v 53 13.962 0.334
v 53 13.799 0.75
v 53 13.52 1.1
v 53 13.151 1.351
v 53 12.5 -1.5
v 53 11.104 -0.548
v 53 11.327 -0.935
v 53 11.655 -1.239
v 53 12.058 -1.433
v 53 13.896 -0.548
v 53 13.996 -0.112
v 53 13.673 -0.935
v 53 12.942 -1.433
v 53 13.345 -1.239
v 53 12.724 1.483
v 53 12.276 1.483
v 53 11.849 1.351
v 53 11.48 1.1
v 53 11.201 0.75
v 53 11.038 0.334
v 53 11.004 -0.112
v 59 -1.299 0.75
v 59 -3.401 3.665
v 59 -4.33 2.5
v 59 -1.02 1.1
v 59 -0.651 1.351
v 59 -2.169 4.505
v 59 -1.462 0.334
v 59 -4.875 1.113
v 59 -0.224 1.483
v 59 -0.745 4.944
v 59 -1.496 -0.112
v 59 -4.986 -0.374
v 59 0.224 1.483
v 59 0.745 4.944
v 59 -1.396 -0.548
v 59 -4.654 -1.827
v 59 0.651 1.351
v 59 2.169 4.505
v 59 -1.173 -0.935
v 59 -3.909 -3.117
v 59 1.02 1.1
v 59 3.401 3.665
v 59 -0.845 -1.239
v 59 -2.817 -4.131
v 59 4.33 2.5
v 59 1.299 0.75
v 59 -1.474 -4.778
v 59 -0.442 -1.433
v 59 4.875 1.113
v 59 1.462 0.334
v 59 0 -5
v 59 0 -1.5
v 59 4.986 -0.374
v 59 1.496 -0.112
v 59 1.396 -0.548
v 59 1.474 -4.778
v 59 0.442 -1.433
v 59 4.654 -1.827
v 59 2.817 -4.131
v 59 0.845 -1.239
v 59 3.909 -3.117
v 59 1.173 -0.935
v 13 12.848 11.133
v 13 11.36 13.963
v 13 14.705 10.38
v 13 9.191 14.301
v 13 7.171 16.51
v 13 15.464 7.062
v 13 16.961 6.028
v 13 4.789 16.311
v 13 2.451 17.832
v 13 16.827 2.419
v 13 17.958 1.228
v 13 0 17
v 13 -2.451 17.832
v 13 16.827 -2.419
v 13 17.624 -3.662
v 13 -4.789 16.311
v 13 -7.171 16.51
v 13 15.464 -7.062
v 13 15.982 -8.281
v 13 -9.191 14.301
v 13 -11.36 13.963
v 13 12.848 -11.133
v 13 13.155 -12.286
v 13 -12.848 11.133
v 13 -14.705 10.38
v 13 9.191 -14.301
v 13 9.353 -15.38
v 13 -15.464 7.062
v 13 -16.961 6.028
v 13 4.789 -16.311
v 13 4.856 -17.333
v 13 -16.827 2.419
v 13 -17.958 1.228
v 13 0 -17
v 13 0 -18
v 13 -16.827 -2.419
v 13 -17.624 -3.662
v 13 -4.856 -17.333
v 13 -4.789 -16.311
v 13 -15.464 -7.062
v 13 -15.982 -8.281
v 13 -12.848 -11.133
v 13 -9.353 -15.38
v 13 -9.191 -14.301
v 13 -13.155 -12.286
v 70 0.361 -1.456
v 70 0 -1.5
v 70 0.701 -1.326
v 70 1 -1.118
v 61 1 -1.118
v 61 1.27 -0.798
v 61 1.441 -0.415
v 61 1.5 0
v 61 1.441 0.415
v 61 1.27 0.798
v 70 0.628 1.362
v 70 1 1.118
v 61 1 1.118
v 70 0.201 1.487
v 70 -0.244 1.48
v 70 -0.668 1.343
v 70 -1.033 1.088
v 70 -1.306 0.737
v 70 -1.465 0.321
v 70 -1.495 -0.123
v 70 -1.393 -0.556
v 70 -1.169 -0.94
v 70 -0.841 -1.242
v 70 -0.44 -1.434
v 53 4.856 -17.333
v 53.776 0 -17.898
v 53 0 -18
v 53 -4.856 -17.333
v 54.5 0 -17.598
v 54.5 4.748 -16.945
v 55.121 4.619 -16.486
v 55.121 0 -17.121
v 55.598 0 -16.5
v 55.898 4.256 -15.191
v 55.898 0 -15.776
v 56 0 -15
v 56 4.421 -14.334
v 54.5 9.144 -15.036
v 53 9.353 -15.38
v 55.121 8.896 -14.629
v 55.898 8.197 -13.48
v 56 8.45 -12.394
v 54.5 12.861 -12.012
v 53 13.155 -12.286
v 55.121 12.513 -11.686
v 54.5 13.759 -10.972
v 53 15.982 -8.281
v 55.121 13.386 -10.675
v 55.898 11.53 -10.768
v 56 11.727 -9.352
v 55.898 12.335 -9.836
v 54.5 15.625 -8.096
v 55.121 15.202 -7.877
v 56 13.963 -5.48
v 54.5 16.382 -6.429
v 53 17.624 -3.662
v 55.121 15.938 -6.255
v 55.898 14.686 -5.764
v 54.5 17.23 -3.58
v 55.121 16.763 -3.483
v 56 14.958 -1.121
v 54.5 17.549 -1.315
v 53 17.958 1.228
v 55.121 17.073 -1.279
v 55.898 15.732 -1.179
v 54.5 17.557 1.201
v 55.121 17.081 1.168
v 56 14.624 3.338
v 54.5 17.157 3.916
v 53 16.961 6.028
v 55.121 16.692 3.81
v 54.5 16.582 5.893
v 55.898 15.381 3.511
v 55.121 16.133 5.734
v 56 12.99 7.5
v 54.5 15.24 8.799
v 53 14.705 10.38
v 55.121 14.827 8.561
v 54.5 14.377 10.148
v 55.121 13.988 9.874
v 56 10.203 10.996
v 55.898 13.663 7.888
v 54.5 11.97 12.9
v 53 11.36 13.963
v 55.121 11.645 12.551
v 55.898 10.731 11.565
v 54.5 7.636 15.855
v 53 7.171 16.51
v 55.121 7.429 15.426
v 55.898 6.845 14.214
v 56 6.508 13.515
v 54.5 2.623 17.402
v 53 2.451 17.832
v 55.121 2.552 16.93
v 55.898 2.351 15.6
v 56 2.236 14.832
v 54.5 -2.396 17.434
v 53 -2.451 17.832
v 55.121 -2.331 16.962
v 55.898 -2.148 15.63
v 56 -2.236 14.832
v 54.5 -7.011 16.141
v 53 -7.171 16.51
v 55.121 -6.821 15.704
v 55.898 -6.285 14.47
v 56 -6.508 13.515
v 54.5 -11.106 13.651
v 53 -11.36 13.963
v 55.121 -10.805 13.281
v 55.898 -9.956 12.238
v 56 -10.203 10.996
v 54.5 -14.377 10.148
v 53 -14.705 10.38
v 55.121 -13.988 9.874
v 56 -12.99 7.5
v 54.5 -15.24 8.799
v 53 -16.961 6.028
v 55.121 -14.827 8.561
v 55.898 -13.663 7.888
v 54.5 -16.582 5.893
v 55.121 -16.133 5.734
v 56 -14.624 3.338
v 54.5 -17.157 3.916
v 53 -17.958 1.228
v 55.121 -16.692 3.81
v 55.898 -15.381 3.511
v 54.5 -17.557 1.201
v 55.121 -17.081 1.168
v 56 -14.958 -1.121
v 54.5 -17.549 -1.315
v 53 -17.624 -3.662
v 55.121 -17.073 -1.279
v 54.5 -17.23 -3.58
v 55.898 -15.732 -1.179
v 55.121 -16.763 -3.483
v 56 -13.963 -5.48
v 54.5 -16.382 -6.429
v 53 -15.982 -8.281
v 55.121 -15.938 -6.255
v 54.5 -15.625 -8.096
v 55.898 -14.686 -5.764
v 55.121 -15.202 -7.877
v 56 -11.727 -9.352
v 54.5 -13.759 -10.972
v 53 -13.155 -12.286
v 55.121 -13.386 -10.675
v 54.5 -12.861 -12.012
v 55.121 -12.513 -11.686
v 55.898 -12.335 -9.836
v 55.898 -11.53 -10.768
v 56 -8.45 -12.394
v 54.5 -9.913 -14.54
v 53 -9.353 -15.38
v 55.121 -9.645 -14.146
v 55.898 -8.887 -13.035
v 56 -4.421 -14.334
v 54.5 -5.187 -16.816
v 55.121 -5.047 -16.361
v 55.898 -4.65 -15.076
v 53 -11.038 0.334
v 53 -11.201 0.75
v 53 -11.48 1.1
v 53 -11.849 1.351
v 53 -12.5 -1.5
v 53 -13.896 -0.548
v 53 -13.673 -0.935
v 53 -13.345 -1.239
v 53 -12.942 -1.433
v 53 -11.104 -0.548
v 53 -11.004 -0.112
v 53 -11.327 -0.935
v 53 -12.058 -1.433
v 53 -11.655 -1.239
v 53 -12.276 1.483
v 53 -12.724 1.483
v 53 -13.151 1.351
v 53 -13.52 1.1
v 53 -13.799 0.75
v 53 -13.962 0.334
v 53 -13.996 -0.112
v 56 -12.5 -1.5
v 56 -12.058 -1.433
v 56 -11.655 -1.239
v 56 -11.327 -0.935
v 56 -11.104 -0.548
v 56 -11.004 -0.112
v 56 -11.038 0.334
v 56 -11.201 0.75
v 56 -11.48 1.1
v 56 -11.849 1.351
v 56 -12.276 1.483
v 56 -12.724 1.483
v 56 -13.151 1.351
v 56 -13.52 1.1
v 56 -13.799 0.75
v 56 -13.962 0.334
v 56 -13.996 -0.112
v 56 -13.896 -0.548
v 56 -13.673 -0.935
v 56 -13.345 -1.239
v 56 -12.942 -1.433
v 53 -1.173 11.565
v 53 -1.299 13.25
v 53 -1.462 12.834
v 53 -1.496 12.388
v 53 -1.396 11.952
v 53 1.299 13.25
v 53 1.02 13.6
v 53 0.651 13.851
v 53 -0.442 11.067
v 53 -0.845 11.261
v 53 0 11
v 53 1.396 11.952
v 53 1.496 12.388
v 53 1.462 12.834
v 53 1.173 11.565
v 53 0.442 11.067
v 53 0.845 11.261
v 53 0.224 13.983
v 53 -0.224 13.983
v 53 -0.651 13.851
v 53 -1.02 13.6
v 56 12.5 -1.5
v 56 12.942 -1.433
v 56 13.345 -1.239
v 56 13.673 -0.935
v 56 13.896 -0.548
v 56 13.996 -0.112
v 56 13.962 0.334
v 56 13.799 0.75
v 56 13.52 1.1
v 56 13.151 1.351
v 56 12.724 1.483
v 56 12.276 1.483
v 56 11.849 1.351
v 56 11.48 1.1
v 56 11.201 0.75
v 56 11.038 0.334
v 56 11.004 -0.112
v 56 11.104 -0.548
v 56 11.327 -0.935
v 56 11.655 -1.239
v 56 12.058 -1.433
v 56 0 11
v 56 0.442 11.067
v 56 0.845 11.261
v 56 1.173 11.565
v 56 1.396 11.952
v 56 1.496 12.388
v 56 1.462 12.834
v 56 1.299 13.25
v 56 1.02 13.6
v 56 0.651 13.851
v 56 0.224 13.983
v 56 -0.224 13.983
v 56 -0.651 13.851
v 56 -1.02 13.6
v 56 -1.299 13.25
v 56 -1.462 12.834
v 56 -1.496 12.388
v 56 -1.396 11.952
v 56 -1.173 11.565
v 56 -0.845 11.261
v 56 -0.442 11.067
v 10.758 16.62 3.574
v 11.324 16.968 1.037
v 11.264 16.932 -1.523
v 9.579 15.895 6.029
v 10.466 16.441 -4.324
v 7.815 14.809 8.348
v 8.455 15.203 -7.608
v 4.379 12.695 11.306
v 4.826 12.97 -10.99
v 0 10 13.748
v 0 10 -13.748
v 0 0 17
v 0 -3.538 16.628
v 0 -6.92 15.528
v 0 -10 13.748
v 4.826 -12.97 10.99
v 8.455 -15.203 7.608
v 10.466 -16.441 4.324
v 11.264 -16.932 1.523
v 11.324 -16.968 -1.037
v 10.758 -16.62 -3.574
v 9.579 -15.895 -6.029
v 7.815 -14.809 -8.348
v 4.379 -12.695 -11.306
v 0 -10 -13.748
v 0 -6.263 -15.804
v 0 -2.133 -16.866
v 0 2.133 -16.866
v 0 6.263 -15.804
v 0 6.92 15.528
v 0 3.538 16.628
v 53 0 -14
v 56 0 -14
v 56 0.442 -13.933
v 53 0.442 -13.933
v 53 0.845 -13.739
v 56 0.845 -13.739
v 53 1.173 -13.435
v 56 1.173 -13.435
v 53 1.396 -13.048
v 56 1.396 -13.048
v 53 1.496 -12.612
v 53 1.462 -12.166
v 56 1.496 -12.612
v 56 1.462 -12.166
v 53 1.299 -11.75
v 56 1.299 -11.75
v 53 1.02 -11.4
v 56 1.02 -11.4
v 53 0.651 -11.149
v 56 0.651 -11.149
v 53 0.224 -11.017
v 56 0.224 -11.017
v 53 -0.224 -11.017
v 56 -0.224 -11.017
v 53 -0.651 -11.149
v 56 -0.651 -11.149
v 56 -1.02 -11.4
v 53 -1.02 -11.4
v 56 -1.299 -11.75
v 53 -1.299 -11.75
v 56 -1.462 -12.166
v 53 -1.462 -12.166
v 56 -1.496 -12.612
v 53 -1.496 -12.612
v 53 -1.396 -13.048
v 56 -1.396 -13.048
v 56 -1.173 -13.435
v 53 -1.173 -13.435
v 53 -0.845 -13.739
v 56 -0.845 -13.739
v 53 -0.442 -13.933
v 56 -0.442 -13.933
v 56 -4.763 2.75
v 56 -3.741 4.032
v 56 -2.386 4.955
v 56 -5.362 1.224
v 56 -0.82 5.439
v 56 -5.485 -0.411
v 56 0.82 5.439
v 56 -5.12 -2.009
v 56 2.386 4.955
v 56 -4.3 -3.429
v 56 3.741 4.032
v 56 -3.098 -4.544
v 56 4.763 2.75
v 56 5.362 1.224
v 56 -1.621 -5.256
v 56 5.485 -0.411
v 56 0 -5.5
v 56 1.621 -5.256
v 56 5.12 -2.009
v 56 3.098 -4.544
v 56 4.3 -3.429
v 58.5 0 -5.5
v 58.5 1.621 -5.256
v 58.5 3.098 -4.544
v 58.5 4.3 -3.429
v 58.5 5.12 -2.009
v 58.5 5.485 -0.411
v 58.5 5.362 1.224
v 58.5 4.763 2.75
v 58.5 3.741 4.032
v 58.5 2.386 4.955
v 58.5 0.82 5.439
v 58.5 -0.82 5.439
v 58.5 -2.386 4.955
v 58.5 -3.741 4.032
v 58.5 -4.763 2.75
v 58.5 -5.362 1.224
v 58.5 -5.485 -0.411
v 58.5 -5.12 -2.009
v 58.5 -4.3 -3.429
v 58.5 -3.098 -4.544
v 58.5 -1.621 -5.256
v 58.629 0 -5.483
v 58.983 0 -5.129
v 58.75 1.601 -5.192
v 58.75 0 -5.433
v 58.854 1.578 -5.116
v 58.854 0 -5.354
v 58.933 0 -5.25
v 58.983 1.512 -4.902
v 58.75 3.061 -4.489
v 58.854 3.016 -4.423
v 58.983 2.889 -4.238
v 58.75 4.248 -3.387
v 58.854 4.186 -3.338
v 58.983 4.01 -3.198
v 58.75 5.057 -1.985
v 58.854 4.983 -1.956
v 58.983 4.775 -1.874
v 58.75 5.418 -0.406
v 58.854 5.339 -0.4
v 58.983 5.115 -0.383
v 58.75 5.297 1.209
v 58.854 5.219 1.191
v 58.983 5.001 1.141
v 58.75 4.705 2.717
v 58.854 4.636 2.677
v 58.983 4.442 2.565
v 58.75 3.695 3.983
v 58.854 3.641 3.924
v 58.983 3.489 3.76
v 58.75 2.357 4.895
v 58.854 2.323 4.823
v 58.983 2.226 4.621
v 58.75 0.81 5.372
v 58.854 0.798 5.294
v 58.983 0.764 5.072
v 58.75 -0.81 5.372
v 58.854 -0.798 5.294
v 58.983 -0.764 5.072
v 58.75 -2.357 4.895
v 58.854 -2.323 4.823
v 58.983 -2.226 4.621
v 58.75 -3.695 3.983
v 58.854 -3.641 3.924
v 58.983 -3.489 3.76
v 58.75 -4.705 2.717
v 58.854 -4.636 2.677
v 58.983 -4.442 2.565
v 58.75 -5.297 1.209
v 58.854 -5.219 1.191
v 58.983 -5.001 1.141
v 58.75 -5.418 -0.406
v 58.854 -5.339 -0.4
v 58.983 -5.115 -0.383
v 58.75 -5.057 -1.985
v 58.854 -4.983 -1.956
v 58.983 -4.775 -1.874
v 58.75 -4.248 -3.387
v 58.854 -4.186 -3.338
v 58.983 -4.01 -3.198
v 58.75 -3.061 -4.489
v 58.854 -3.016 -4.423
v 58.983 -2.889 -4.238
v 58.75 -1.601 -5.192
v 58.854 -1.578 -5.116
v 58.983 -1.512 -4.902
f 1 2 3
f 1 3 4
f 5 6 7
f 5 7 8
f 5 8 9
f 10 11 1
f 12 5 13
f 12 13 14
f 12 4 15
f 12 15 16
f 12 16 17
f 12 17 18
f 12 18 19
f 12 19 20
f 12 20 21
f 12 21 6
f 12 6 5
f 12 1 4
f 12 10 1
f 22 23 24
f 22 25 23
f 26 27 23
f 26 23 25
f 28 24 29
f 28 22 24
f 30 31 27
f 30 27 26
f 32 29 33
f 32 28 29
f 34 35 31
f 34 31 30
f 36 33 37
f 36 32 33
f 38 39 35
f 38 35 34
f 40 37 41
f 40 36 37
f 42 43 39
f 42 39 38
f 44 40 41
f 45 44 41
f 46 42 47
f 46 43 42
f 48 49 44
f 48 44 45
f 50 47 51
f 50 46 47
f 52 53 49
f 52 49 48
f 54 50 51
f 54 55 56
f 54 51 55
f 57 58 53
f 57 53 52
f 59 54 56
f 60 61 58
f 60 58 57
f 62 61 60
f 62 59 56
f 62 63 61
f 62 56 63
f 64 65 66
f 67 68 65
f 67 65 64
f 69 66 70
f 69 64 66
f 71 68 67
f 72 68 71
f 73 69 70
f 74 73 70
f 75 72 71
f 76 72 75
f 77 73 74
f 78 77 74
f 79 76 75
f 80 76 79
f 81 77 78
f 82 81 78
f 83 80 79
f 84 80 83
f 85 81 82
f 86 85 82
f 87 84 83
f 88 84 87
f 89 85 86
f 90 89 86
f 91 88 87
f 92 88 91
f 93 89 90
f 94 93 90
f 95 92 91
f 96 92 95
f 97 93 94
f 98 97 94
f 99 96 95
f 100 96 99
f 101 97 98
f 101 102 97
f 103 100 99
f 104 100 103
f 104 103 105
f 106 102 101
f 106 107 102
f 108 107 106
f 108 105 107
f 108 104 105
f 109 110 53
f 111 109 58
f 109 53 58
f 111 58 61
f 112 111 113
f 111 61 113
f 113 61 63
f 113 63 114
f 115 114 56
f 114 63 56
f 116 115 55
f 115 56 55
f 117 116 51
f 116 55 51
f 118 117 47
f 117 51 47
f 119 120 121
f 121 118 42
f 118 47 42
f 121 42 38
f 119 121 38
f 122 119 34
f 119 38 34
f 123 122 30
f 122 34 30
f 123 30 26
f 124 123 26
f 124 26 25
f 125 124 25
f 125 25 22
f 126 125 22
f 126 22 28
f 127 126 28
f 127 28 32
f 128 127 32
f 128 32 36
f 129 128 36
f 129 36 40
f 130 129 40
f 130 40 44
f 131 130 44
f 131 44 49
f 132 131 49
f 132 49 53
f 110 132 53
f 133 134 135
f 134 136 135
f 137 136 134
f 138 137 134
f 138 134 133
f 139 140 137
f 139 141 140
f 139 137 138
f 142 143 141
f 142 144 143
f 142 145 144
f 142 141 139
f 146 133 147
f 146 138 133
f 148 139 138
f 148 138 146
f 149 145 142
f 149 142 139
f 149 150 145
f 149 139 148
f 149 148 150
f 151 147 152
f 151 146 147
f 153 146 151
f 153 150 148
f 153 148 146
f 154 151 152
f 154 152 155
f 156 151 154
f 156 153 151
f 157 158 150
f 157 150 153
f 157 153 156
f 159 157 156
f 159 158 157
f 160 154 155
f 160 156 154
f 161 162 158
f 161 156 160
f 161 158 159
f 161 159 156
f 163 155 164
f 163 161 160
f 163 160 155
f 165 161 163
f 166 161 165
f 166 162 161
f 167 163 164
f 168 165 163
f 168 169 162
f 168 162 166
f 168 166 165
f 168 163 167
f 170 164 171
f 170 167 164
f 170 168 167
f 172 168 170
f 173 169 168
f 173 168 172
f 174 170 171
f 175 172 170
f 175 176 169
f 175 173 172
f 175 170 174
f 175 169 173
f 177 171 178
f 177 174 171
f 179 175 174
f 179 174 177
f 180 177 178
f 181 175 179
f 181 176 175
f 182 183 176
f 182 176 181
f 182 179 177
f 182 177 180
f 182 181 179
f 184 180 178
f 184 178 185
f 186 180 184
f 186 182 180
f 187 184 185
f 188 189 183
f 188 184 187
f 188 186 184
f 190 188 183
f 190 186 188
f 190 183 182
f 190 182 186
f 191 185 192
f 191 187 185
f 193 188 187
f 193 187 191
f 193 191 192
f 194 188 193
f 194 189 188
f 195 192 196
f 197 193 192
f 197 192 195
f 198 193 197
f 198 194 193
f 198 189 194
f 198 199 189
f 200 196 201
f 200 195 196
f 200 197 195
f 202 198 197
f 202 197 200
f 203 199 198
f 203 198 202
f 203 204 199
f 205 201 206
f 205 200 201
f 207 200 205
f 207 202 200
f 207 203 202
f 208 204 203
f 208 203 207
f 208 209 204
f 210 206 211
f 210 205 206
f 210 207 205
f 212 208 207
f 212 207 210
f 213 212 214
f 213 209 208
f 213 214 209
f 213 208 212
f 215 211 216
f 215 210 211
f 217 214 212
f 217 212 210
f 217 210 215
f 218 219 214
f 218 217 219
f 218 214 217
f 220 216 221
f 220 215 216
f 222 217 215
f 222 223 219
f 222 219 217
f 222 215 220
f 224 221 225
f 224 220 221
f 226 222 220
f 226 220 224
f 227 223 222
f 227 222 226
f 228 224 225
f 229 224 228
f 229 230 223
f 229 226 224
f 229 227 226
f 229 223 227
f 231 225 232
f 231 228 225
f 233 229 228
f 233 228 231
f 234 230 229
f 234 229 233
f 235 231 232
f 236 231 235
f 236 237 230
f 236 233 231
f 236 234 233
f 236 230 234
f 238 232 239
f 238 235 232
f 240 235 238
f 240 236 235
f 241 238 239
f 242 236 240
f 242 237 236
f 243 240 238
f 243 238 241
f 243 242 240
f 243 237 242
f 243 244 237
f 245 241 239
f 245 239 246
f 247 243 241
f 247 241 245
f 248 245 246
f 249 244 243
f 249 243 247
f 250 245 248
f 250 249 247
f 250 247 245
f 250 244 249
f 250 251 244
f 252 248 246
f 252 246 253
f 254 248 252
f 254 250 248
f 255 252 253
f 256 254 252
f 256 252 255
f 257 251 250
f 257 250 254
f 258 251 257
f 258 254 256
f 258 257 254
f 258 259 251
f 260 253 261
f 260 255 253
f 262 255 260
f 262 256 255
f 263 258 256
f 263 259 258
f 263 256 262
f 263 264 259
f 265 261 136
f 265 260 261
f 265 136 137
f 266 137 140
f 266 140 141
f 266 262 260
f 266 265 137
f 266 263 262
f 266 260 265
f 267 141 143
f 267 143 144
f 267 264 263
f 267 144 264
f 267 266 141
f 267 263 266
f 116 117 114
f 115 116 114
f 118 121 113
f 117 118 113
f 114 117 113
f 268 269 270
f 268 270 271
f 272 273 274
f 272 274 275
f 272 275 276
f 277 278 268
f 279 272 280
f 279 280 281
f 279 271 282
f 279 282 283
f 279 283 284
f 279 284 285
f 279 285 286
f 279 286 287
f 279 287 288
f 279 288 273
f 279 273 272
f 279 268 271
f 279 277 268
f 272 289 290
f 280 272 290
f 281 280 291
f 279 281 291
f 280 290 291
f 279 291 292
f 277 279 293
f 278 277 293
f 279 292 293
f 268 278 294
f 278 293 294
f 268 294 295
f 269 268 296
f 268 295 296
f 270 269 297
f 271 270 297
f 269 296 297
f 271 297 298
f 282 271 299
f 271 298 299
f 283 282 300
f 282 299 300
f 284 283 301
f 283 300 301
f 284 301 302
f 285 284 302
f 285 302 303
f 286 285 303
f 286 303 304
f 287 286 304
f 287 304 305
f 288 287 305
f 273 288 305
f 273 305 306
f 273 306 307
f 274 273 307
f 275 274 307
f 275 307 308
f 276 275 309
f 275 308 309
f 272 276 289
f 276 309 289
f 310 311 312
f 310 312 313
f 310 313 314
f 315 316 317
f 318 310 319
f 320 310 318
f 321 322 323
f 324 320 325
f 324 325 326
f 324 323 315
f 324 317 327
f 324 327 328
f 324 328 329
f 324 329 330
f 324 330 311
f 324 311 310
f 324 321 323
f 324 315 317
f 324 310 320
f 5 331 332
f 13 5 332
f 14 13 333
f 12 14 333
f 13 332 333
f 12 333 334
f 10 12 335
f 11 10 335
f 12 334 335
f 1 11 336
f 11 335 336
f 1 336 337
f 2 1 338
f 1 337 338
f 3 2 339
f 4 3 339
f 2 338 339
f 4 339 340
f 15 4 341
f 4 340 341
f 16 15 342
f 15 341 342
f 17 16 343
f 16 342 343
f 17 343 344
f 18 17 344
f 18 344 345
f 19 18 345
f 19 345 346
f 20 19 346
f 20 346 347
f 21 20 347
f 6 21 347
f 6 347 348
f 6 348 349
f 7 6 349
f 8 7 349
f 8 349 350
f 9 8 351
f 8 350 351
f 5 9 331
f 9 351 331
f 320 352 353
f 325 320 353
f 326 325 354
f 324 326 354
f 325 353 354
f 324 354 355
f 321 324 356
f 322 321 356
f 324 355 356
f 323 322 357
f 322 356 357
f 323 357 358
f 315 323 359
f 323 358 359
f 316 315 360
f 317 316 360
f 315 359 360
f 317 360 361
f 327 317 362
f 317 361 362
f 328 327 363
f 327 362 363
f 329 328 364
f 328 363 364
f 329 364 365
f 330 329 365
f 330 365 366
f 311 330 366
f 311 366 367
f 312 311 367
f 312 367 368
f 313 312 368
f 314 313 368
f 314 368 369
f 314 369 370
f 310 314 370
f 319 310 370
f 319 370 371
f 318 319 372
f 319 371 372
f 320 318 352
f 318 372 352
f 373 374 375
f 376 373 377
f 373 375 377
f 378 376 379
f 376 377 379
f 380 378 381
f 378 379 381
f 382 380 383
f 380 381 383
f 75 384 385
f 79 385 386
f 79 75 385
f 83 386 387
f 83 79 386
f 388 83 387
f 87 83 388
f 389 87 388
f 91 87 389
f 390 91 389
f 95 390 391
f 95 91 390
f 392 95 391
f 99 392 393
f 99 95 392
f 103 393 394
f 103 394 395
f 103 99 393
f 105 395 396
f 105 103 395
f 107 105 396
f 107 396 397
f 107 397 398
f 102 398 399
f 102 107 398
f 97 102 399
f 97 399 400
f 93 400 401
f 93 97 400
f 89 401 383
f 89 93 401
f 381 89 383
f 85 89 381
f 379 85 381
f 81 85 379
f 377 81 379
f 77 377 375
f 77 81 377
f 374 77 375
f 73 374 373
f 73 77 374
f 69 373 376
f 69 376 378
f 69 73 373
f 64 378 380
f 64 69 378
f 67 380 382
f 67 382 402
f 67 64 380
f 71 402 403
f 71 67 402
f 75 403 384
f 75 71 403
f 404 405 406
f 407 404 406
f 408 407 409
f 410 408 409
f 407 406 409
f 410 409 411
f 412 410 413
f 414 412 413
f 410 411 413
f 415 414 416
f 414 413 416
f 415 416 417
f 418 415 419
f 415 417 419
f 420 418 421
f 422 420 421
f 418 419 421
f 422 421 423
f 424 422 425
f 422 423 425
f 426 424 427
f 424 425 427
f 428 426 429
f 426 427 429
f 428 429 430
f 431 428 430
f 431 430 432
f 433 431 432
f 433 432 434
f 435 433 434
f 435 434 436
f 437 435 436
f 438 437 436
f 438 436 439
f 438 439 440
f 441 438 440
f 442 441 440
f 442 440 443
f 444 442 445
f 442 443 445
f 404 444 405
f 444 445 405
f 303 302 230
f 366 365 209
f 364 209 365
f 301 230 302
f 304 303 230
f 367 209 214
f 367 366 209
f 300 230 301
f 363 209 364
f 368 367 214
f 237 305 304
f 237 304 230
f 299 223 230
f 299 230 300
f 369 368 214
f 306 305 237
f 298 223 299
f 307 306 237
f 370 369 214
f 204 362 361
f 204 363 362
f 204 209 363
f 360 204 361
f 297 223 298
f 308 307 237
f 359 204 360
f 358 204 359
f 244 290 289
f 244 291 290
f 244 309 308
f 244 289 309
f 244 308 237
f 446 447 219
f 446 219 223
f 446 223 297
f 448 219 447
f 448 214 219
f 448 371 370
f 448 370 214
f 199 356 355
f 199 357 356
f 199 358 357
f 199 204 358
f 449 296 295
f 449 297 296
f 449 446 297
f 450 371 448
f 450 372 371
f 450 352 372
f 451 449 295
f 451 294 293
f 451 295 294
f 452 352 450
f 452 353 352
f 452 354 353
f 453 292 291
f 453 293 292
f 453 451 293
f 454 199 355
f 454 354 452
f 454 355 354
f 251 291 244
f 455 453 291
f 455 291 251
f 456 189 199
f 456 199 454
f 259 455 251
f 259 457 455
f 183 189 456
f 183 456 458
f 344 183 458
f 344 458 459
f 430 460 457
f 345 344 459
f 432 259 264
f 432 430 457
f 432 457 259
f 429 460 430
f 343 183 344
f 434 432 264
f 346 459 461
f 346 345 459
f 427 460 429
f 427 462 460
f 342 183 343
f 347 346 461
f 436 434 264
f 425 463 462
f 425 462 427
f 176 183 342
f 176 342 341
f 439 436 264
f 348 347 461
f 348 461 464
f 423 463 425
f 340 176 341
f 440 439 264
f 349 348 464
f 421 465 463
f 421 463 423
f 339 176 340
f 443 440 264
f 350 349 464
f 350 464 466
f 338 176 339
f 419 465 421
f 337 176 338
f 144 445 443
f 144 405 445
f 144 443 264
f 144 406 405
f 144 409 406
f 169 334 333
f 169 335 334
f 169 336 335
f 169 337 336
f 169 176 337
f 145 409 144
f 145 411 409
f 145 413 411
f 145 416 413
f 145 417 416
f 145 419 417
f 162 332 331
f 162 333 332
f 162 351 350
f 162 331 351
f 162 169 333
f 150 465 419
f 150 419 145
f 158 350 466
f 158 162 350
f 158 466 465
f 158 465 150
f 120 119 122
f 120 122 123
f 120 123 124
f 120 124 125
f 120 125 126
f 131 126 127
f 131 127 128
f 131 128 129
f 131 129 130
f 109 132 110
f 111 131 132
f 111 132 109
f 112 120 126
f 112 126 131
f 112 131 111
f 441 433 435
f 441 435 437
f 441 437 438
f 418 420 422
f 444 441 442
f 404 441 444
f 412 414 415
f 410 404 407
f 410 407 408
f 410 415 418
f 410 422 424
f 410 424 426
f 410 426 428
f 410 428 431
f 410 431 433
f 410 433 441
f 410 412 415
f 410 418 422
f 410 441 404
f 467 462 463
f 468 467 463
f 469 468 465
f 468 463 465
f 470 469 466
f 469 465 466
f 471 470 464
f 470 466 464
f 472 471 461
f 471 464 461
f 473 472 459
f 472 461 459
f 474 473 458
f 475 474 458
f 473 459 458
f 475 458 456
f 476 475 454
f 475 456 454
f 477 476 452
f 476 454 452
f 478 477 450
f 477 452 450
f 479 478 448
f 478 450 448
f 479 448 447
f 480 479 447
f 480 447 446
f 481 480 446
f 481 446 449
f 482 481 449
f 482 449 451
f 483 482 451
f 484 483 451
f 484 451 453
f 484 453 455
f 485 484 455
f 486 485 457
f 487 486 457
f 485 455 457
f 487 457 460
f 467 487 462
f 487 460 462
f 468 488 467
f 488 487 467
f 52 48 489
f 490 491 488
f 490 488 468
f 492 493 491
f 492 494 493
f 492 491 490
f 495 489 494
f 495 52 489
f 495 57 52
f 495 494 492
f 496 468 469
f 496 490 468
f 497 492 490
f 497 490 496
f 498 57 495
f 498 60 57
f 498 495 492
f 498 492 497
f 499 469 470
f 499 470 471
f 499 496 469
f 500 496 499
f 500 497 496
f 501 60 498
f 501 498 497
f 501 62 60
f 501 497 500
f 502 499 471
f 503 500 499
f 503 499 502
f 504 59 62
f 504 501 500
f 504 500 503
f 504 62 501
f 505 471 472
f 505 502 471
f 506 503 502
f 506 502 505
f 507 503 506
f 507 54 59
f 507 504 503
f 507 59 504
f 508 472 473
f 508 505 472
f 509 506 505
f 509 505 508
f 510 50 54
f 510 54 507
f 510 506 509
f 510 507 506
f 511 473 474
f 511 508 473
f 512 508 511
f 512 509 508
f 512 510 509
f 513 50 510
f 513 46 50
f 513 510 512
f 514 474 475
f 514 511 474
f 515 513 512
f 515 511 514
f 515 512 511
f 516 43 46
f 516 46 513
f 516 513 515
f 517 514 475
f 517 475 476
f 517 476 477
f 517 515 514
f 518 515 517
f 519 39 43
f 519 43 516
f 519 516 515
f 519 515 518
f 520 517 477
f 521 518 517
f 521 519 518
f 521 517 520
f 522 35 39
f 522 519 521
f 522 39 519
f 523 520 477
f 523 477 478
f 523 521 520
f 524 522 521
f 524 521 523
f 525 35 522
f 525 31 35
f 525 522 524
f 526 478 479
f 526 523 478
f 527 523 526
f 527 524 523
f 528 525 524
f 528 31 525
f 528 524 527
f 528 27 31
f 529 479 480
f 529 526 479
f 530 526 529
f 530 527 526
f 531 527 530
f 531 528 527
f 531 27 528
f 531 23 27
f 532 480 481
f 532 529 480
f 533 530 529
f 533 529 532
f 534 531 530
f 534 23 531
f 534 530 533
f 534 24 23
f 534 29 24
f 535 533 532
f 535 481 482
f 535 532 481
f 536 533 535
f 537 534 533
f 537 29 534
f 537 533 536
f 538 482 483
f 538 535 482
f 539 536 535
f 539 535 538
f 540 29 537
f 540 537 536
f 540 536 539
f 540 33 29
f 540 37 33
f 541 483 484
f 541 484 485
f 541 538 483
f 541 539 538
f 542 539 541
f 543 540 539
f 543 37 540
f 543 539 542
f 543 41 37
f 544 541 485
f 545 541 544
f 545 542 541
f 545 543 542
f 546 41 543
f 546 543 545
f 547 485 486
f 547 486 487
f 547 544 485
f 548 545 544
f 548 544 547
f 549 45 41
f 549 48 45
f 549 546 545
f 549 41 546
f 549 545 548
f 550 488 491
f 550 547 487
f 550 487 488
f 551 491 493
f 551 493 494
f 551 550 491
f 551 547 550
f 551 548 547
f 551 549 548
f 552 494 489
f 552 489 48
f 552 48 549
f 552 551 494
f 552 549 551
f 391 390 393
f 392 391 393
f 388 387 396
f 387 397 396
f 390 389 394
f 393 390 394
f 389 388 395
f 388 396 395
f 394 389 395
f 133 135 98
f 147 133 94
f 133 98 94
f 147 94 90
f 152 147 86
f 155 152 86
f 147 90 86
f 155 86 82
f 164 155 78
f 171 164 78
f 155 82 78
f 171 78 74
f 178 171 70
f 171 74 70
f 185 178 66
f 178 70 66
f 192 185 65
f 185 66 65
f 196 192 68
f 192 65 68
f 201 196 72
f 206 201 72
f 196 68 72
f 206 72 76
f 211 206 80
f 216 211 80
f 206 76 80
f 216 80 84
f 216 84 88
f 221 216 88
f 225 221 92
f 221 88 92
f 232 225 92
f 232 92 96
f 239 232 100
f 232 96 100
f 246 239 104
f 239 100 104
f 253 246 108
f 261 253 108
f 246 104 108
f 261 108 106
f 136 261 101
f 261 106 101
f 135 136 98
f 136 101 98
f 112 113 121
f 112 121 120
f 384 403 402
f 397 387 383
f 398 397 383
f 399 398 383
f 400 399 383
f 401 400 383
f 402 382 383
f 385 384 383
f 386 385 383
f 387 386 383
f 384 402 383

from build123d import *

# Parameters (mm, degrees)
SKETCH1_R                           = 18
BOSS_EXTRUDE1_DEPTH                 = 56
FILLET1_R                           = 3
CUT_EXTRUDE1_START                  = -14.96663
CUT_EXTRUDE1_DEPTH                  = 29.93326
SKETCH3_W                           = 13
SKETCH3_H                           = 1
SKETCH4_R                           = 5.5
BOSS_EXTRUDE2_DEPTH                 = 3
FILLET2_R                           = 0.5
SKETCH5_R                           = 1.5
BOSS_EXTRUDE3_DEPTH                 = 11
CUT_EXTRUDE2_REACH                  = 76.485
CUT_EXTRUDE2_END_RADIUS             = 1.5
SKETCH6_W                           = 9
SKETCH6_H                           = 0.5
CUT_EXTRUDE2_DIRECTION_2_REACH      = 76.485
CUT_EXTRUDE2_DIRECTION_2_END_RADIUS = 1.5
SKETCH7_R                           = 1.5
CUT_EXTRUDE3_DEPTH                  = 3


with BuildPart() as part:
    # Sketch1 → Boss-Extrude1 (new body)
    with BuildSketch(Plane(origin=(0, 0, 0), x_dir=(0, 0, -1), z_dir=(1, 0, 0))):
        Circle(SKETCH1_R)
    extrude(amount=BOSS_EXTRUDE1_DEPTH)

    # Fillet1
    fillet1_edges = [part.edges().sort_by_distance(p)[0] for p in [
        (56, 0, 18),
    ]]
    fillet(fillet1_edges, radius=FILLET1_R)

    # Sketch2 → Cut-Extrude1 (cut)
    with BuildSketch(Plane.XY.offset(CUT_EXTRUDE1_START)):
        Polygon((13, 18), (0, 10), (0, -10), (13, -18), (0, -18), (-7.803780753, 17.225837115), (0, 18), align=None)
    extrude(amount=CUT_EXTRUDE1_DEPTH, mode=Mode.SUBTRACT)

    # Sketch3 → Cut-Revolve1 (revolve, cut)
    with BuildSketch(Plane.XY, mode=Mode.PRIVATE) as cut_revolve1_sk:
        with Locations((6.5, 17.5)):
            Rectangle(SKETCH3_W, SKETCH3_H)
    revolve(cut_revolve1_sk.sketch.rotate(Axis((-1000, 0, 0), (1, 0, 0)), 90), axis=Axis((-1000, 0, 0), (1, 0, 0)), mode=Mode.SUBTRACT)

    # Sketch4 → Boss-Extrude2 (add)
    with BuildSketch(Plane(origin=(56, 0, 0), x_dir=(0, 0, -1), z_dir=(1, 0, 0))):
        Circle(SKETCH4_R)
    extrude(amount=BOSS_EXTRUDE2_DEPTH)

    # Fillet2
    fillet2_edges = [part.edges().sort_by_distance(p)[0] for p in [
        (59, 0, 5.5),
    ]]
    fillet(fillet2_edges, radius=FILLET2_R)

    # Sketch5 → Boss-Extrude3 (add)
    with BuildSketch(Plane(origin=(59, 0, 0), x_dir=(0, 0, -1), z_dir=(1, 0, 0))):
        Circle(SKETCH5_R)
    extrude(amount=BOSS_EXTRUDE3_DEPTH)

    # Cut-Extrude2: up to this cylinder (the profile starts inside it)
    cut_extrude2_end = Plane(origin=(65.5, 0, 0), z_dir=(-1, 0, 0)) * Cylinder(CUT_EXTRUDE2_END_RADIUS, 156.97, mode=Mode.PRIVATE)
    # Sketch6 → Cut-Extrude2 (cut, up to the surface)
    with BuildSketch(Plane.XY, mode=Mode.PRIVATE) as cut_extrude2_sk1:
        with Locations((65.5, 1.25)):
            Rectangle(SKETCH6_W, SKETCH6_H)
    cut_extrude2_tool1 = extrude(cut_extrude2_sk1.sketch, amount=-CUT_EXTRUDE2_REACH, mode=Mode.PRIVATE) & cut_extrude2_end
    add(cut_extrude2_tool1.solids().sort_by_distance((65.5, 1.25, 0))[0], mode=Mode.SUBTRACT)

    # Cut-Extrude2 direction 2: up to this cylinder (the profile starts inside it)
    cut_extrude2_direction_2_end = Plane(origin=(65.5, 0, 0), z_dir=(-1, 0, 0)) * Cylinder(CUT_EXTRUDE2_DIRECTION_2_END_RADIUS, 156.97, mode=Mode.PRIVATE)
    # Sketch6 → Cut-Extrude2 direction 2 (cut, up to the surface)
    with BuildSketch(Plane.XY, mode=Mode.PRIVATE) as cut_extrude2_direction_2_sk1:
        with Locations((65.5, 1.25)):
            Rectangle(SKETCH6_W, SKETCH6_H)
    cut_extrude2_direction_2_tool1 = extrude(cut_extrude2_direction_2_sk1.sketch, amount=CUT_EXTRUDE2_DIRECTION_2_REACH, mode=Mode.PRIVATE) & cut_extrude2_direction_2_end
    add(cut_extrude2_direction_2_tool1.solids().sort_by_distance((65.5, 1.25, 0))[0], mode=Mode.SUBTRACT)

    # Sketch7 → Cut-Extrude3 (cut)
    with BuildSketch(Plane(origin=(56, 0, 0), x_dir=(0, 0, -1), z_dir=(1, 0, 0))):
        with Locations((0, 12.5)):
            Circle(SKETCH7_R)
        with Locations((12.5, 0)):
            Circle(SKETCH7_R)
        with Locations((0, -12.5)):
            Circle(SKETCH7_R)
        with Locations((-12.5, 0)):
            Circle(SKETCH7_R)
    extrude(amount=-CUT_EXTRUDE3_DEPTH, mode=Mode.SUBTRACT)


solid = part.part
